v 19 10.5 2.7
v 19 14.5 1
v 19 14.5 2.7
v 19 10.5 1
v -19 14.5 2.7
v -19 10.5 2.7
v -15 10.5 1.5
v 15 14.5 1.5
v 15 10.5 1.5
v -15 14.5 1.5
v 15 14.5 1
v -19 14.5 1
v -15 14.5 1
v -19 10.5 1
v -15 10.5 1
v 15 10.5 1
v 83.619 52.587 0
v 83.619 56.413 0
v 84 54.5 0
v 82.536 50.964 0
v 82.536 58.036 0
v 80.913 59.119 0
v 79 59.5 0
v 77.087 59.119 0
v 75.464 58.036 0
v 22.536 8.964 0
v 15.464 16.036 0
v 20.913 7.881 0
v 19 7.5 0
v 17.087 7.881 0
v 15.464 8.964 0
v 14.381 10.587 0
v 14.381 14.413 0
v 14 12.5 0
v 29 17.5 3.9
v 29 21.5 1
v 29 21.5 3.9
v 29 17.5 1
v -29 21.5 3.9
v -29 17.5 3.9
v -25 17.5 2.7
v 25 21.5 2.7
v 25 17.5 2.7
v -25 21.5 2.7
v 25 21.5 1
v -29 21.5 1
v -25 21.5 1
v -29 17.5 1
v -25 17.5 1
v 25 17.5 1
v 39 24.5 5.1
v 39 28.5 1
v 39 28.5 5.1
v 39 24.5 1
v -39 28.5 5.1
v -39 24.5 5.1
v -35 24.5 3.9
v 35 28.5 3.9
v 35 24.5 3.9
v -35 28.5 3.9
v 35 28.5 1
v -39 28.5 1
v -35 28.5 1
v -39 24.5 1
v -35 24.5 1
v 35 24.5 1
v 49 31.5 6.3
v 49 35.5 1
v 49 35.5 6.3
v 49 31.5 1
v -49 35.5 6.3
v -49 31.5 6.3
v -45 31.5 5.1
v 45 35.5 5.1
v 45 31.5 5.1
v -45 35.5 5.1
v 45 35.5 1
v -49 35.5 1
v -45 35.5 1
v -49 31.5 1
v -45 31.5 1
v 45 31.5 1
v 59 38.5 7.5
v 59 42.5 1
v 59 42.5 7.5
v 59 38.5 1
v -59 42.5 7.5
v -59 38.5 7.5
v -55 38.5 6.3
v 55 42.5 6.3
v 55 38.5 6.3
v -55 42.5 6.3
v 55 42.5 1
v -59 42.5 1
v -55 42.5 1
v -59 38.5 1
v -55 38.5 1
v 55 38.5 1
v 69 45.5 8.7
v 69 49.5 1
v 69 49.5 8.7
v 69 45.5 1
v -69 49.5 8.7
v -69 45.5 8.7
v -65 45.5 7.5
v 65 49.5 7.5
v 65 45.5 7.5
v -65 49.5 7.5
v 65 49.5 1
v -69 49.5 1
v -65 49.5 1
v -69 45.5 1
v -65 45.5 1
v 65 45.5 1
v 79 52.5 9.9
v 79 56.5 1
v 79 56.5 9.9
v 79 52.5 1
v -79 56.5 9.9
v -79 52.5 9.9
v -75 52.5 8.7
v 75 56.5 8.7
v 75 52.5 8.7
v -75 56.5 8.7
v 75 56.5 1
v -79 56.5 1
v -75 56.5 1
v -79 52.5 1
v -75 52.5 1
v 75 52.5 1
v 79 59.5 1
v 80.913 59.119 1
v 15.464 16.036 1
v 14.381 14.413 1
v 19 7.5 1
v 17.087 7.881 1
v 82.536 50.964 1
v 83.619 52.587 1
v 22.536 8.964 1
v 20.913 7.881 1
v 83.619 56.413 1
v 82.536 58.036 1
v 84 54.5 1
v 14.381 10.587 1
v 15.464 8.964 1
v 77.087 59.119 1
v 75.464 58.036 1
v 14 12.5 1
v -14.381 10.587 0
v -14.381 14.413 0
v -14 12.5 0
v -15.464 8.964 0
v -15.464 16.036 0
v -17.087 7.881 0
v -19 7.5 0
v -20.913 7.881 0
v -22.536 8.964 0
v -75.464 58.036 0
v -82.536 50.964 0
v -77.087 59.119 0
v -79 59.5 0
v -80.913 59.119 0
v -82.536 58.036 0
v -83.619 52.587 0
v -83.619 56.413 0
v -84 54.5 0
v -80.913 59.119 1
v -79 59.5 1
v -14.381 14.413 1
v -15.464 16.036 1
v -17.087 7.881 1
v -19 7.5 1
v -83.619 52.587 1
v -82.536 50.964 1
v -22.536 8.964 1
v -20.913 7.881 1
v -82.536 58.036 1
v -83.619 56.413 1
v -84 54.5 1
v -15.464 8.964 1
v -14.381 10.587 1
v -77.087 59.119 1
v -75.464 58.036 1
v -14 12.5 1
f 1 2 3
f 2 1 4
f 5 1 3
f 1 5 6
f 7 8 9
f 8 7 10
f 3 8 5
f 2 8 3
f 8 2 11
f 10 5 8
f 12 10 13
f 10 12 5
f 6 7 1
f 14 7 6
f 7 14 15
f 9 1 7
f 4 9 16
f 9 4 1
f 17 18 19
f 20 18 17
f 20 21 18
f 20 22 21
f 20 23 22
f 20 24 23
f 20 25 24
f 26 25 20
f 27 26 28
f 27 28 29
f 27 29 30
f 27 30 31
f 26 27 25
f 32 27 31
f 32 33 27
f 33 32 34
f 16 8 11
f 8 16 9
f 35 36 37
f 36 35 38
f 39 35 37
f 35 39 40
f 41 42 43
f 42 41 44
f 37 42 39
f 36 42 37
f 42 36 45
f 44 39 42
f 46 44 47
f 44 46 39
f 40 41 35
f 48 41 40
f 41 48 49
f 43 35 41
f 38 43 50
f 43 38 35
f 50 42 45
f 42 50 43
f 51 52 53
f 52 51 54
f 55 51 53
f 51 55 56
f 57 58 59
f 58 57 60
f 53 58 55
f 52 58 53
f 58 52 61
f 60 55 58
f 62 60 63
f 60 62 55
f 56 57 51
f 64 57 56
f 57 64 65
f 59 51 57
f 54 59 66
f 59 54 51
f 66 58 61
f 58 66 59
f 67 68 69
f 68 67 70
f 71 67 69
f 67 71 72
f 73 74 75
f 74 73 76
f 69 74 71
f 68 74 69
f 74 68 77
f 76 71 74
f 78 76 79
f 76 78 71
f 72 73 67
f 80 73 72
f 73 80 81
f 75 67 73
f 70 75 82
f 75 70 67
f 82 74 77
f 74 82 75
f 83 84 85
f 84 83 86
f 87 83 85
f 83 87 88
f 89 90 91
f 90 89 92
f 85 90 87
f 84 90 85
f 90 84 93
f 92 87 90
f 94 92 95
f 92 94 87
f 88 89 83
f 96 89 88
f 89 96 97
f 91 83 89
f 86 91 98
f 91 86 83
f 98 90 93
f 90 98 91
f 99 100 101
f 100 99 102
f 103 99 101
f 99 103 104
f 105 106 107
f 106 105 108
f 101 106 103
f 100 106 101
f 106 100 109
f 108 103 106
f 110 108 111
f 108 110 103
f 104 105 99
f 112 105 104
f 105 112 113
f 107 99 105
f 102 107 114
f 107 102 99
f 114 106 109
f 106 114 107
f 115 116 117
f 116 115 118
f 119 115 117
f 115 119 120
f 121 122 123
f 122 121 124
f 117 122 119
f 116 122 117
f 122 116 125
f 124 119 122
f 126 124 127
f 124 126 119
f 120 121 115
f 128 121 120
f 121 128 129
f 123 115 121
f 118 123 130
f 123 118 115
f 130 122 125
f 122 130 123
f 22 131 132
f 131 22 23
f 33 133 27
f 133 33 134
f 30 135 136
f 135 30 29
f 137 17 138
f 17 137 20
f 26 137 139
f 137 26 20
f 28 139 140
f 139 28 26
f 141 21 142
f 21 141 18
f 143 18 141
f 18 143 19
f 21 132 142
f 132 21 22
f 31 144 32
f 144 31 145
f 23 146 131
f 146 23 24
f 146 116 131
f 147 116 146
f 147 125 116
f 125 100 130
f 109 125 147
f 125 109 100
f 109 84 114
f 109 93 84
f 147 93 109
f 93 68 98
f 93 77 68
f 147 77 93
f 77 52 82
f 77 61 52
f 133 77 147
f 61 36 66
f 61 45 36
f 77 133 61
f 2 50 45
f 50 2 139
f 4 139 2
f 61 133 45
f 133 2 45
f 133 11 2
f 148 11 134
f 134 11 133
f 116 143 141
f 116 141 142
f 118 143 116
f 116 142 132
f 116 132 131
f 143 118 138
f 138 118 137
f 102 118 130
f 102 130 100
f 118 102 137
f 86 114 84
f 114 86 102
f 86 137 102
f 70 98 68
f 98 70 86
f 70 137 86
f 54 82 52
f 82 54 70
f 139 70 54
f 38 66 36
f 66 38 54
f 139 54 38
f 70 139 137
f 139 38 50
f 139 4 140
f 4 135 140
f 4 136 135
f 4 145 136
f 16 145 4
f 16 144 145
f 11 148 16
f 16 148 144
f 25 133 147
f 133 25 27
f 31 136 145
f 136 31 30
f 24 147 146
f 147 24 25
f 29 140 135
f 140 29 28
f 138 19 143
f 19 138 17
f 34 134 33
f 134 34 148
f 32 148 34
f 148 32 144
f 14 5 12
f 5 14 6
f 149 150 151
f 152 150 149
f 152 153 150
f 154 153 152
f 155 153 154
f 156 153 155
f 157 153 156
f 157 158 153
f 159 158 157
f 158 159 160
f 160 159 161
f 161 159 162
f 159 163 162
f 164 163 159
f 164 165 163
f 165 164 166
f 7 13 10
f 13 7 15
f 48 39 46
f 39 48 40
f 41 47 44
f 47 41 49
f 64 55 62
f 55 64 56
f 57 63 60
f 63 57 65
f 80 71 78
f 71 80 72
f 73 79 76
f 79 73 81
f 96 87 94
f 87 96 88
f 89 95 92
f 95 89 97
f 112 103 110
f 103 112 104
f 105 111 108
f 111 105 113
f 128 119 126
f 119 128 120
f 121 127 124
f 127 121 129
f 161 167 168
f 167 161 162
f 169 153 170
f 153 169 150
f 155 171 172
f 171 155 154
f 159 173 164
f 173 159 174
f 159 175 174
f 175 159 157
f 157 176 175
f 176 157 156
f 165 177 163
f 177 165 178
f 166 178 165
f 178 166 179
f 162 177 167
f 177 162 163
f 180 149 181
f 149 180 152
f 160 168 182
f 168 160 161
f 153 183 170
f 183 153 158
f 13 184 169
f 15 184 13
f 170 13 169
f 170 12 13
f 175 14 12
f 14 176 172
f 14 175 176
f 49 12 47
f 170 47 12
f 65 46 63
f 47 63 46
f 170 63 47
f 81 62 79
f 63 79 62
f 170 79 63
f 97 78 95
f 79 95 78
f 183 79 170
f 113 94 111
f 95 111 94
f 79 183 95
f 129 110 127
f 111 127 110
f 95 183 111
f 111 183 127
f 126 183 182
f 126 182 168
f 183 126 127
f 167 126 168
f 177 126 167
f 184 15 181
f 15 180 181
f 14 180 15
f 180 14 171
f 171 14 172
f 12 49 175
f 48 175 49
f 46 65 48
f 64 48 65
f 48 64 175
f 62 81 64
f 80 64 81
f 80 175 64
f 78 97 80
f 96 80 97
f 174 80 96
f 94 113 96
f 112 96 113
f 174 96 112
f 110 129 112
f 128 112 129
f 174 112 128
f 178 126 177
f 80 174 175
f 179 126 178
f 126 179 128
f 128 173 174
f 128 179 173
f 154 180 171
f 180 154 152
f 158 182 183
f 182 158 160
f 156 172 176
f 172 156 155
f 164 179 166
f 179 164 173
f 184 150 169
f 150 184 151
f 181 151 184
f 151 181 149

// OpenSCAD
// bridge spans, lenght unit in 10mm. [start:step:end]
spans = [3:2:15]; 
thickness = 1.2;
h_base = 1.5;
z_delta = thickness / 2;

module bridge(i, i0, step) {
  z = z_delta*(i-i0)+h_base;
  // bridge
  translate([0, 7*i/step, z]) cube([5*i+4, 4, thickness]);
  // pillar
  at(i, step) cube([4, 4, z]);
}

module at(i, step) {
  translate([5*i, 7*i/step, 0]) children();
}

module x_mirror() {
  children();
  mirror([1,0,0]) children();
}

module raft() {
  translate([4,2,0]) cylinder(d=10, h=1);
}

x_mirror() {
  for(i=spans)
    bridge(i, spans[0], spans[1]);
  hull()
    for(i=spans) 
      at(i, spans[1]) raft();
}
